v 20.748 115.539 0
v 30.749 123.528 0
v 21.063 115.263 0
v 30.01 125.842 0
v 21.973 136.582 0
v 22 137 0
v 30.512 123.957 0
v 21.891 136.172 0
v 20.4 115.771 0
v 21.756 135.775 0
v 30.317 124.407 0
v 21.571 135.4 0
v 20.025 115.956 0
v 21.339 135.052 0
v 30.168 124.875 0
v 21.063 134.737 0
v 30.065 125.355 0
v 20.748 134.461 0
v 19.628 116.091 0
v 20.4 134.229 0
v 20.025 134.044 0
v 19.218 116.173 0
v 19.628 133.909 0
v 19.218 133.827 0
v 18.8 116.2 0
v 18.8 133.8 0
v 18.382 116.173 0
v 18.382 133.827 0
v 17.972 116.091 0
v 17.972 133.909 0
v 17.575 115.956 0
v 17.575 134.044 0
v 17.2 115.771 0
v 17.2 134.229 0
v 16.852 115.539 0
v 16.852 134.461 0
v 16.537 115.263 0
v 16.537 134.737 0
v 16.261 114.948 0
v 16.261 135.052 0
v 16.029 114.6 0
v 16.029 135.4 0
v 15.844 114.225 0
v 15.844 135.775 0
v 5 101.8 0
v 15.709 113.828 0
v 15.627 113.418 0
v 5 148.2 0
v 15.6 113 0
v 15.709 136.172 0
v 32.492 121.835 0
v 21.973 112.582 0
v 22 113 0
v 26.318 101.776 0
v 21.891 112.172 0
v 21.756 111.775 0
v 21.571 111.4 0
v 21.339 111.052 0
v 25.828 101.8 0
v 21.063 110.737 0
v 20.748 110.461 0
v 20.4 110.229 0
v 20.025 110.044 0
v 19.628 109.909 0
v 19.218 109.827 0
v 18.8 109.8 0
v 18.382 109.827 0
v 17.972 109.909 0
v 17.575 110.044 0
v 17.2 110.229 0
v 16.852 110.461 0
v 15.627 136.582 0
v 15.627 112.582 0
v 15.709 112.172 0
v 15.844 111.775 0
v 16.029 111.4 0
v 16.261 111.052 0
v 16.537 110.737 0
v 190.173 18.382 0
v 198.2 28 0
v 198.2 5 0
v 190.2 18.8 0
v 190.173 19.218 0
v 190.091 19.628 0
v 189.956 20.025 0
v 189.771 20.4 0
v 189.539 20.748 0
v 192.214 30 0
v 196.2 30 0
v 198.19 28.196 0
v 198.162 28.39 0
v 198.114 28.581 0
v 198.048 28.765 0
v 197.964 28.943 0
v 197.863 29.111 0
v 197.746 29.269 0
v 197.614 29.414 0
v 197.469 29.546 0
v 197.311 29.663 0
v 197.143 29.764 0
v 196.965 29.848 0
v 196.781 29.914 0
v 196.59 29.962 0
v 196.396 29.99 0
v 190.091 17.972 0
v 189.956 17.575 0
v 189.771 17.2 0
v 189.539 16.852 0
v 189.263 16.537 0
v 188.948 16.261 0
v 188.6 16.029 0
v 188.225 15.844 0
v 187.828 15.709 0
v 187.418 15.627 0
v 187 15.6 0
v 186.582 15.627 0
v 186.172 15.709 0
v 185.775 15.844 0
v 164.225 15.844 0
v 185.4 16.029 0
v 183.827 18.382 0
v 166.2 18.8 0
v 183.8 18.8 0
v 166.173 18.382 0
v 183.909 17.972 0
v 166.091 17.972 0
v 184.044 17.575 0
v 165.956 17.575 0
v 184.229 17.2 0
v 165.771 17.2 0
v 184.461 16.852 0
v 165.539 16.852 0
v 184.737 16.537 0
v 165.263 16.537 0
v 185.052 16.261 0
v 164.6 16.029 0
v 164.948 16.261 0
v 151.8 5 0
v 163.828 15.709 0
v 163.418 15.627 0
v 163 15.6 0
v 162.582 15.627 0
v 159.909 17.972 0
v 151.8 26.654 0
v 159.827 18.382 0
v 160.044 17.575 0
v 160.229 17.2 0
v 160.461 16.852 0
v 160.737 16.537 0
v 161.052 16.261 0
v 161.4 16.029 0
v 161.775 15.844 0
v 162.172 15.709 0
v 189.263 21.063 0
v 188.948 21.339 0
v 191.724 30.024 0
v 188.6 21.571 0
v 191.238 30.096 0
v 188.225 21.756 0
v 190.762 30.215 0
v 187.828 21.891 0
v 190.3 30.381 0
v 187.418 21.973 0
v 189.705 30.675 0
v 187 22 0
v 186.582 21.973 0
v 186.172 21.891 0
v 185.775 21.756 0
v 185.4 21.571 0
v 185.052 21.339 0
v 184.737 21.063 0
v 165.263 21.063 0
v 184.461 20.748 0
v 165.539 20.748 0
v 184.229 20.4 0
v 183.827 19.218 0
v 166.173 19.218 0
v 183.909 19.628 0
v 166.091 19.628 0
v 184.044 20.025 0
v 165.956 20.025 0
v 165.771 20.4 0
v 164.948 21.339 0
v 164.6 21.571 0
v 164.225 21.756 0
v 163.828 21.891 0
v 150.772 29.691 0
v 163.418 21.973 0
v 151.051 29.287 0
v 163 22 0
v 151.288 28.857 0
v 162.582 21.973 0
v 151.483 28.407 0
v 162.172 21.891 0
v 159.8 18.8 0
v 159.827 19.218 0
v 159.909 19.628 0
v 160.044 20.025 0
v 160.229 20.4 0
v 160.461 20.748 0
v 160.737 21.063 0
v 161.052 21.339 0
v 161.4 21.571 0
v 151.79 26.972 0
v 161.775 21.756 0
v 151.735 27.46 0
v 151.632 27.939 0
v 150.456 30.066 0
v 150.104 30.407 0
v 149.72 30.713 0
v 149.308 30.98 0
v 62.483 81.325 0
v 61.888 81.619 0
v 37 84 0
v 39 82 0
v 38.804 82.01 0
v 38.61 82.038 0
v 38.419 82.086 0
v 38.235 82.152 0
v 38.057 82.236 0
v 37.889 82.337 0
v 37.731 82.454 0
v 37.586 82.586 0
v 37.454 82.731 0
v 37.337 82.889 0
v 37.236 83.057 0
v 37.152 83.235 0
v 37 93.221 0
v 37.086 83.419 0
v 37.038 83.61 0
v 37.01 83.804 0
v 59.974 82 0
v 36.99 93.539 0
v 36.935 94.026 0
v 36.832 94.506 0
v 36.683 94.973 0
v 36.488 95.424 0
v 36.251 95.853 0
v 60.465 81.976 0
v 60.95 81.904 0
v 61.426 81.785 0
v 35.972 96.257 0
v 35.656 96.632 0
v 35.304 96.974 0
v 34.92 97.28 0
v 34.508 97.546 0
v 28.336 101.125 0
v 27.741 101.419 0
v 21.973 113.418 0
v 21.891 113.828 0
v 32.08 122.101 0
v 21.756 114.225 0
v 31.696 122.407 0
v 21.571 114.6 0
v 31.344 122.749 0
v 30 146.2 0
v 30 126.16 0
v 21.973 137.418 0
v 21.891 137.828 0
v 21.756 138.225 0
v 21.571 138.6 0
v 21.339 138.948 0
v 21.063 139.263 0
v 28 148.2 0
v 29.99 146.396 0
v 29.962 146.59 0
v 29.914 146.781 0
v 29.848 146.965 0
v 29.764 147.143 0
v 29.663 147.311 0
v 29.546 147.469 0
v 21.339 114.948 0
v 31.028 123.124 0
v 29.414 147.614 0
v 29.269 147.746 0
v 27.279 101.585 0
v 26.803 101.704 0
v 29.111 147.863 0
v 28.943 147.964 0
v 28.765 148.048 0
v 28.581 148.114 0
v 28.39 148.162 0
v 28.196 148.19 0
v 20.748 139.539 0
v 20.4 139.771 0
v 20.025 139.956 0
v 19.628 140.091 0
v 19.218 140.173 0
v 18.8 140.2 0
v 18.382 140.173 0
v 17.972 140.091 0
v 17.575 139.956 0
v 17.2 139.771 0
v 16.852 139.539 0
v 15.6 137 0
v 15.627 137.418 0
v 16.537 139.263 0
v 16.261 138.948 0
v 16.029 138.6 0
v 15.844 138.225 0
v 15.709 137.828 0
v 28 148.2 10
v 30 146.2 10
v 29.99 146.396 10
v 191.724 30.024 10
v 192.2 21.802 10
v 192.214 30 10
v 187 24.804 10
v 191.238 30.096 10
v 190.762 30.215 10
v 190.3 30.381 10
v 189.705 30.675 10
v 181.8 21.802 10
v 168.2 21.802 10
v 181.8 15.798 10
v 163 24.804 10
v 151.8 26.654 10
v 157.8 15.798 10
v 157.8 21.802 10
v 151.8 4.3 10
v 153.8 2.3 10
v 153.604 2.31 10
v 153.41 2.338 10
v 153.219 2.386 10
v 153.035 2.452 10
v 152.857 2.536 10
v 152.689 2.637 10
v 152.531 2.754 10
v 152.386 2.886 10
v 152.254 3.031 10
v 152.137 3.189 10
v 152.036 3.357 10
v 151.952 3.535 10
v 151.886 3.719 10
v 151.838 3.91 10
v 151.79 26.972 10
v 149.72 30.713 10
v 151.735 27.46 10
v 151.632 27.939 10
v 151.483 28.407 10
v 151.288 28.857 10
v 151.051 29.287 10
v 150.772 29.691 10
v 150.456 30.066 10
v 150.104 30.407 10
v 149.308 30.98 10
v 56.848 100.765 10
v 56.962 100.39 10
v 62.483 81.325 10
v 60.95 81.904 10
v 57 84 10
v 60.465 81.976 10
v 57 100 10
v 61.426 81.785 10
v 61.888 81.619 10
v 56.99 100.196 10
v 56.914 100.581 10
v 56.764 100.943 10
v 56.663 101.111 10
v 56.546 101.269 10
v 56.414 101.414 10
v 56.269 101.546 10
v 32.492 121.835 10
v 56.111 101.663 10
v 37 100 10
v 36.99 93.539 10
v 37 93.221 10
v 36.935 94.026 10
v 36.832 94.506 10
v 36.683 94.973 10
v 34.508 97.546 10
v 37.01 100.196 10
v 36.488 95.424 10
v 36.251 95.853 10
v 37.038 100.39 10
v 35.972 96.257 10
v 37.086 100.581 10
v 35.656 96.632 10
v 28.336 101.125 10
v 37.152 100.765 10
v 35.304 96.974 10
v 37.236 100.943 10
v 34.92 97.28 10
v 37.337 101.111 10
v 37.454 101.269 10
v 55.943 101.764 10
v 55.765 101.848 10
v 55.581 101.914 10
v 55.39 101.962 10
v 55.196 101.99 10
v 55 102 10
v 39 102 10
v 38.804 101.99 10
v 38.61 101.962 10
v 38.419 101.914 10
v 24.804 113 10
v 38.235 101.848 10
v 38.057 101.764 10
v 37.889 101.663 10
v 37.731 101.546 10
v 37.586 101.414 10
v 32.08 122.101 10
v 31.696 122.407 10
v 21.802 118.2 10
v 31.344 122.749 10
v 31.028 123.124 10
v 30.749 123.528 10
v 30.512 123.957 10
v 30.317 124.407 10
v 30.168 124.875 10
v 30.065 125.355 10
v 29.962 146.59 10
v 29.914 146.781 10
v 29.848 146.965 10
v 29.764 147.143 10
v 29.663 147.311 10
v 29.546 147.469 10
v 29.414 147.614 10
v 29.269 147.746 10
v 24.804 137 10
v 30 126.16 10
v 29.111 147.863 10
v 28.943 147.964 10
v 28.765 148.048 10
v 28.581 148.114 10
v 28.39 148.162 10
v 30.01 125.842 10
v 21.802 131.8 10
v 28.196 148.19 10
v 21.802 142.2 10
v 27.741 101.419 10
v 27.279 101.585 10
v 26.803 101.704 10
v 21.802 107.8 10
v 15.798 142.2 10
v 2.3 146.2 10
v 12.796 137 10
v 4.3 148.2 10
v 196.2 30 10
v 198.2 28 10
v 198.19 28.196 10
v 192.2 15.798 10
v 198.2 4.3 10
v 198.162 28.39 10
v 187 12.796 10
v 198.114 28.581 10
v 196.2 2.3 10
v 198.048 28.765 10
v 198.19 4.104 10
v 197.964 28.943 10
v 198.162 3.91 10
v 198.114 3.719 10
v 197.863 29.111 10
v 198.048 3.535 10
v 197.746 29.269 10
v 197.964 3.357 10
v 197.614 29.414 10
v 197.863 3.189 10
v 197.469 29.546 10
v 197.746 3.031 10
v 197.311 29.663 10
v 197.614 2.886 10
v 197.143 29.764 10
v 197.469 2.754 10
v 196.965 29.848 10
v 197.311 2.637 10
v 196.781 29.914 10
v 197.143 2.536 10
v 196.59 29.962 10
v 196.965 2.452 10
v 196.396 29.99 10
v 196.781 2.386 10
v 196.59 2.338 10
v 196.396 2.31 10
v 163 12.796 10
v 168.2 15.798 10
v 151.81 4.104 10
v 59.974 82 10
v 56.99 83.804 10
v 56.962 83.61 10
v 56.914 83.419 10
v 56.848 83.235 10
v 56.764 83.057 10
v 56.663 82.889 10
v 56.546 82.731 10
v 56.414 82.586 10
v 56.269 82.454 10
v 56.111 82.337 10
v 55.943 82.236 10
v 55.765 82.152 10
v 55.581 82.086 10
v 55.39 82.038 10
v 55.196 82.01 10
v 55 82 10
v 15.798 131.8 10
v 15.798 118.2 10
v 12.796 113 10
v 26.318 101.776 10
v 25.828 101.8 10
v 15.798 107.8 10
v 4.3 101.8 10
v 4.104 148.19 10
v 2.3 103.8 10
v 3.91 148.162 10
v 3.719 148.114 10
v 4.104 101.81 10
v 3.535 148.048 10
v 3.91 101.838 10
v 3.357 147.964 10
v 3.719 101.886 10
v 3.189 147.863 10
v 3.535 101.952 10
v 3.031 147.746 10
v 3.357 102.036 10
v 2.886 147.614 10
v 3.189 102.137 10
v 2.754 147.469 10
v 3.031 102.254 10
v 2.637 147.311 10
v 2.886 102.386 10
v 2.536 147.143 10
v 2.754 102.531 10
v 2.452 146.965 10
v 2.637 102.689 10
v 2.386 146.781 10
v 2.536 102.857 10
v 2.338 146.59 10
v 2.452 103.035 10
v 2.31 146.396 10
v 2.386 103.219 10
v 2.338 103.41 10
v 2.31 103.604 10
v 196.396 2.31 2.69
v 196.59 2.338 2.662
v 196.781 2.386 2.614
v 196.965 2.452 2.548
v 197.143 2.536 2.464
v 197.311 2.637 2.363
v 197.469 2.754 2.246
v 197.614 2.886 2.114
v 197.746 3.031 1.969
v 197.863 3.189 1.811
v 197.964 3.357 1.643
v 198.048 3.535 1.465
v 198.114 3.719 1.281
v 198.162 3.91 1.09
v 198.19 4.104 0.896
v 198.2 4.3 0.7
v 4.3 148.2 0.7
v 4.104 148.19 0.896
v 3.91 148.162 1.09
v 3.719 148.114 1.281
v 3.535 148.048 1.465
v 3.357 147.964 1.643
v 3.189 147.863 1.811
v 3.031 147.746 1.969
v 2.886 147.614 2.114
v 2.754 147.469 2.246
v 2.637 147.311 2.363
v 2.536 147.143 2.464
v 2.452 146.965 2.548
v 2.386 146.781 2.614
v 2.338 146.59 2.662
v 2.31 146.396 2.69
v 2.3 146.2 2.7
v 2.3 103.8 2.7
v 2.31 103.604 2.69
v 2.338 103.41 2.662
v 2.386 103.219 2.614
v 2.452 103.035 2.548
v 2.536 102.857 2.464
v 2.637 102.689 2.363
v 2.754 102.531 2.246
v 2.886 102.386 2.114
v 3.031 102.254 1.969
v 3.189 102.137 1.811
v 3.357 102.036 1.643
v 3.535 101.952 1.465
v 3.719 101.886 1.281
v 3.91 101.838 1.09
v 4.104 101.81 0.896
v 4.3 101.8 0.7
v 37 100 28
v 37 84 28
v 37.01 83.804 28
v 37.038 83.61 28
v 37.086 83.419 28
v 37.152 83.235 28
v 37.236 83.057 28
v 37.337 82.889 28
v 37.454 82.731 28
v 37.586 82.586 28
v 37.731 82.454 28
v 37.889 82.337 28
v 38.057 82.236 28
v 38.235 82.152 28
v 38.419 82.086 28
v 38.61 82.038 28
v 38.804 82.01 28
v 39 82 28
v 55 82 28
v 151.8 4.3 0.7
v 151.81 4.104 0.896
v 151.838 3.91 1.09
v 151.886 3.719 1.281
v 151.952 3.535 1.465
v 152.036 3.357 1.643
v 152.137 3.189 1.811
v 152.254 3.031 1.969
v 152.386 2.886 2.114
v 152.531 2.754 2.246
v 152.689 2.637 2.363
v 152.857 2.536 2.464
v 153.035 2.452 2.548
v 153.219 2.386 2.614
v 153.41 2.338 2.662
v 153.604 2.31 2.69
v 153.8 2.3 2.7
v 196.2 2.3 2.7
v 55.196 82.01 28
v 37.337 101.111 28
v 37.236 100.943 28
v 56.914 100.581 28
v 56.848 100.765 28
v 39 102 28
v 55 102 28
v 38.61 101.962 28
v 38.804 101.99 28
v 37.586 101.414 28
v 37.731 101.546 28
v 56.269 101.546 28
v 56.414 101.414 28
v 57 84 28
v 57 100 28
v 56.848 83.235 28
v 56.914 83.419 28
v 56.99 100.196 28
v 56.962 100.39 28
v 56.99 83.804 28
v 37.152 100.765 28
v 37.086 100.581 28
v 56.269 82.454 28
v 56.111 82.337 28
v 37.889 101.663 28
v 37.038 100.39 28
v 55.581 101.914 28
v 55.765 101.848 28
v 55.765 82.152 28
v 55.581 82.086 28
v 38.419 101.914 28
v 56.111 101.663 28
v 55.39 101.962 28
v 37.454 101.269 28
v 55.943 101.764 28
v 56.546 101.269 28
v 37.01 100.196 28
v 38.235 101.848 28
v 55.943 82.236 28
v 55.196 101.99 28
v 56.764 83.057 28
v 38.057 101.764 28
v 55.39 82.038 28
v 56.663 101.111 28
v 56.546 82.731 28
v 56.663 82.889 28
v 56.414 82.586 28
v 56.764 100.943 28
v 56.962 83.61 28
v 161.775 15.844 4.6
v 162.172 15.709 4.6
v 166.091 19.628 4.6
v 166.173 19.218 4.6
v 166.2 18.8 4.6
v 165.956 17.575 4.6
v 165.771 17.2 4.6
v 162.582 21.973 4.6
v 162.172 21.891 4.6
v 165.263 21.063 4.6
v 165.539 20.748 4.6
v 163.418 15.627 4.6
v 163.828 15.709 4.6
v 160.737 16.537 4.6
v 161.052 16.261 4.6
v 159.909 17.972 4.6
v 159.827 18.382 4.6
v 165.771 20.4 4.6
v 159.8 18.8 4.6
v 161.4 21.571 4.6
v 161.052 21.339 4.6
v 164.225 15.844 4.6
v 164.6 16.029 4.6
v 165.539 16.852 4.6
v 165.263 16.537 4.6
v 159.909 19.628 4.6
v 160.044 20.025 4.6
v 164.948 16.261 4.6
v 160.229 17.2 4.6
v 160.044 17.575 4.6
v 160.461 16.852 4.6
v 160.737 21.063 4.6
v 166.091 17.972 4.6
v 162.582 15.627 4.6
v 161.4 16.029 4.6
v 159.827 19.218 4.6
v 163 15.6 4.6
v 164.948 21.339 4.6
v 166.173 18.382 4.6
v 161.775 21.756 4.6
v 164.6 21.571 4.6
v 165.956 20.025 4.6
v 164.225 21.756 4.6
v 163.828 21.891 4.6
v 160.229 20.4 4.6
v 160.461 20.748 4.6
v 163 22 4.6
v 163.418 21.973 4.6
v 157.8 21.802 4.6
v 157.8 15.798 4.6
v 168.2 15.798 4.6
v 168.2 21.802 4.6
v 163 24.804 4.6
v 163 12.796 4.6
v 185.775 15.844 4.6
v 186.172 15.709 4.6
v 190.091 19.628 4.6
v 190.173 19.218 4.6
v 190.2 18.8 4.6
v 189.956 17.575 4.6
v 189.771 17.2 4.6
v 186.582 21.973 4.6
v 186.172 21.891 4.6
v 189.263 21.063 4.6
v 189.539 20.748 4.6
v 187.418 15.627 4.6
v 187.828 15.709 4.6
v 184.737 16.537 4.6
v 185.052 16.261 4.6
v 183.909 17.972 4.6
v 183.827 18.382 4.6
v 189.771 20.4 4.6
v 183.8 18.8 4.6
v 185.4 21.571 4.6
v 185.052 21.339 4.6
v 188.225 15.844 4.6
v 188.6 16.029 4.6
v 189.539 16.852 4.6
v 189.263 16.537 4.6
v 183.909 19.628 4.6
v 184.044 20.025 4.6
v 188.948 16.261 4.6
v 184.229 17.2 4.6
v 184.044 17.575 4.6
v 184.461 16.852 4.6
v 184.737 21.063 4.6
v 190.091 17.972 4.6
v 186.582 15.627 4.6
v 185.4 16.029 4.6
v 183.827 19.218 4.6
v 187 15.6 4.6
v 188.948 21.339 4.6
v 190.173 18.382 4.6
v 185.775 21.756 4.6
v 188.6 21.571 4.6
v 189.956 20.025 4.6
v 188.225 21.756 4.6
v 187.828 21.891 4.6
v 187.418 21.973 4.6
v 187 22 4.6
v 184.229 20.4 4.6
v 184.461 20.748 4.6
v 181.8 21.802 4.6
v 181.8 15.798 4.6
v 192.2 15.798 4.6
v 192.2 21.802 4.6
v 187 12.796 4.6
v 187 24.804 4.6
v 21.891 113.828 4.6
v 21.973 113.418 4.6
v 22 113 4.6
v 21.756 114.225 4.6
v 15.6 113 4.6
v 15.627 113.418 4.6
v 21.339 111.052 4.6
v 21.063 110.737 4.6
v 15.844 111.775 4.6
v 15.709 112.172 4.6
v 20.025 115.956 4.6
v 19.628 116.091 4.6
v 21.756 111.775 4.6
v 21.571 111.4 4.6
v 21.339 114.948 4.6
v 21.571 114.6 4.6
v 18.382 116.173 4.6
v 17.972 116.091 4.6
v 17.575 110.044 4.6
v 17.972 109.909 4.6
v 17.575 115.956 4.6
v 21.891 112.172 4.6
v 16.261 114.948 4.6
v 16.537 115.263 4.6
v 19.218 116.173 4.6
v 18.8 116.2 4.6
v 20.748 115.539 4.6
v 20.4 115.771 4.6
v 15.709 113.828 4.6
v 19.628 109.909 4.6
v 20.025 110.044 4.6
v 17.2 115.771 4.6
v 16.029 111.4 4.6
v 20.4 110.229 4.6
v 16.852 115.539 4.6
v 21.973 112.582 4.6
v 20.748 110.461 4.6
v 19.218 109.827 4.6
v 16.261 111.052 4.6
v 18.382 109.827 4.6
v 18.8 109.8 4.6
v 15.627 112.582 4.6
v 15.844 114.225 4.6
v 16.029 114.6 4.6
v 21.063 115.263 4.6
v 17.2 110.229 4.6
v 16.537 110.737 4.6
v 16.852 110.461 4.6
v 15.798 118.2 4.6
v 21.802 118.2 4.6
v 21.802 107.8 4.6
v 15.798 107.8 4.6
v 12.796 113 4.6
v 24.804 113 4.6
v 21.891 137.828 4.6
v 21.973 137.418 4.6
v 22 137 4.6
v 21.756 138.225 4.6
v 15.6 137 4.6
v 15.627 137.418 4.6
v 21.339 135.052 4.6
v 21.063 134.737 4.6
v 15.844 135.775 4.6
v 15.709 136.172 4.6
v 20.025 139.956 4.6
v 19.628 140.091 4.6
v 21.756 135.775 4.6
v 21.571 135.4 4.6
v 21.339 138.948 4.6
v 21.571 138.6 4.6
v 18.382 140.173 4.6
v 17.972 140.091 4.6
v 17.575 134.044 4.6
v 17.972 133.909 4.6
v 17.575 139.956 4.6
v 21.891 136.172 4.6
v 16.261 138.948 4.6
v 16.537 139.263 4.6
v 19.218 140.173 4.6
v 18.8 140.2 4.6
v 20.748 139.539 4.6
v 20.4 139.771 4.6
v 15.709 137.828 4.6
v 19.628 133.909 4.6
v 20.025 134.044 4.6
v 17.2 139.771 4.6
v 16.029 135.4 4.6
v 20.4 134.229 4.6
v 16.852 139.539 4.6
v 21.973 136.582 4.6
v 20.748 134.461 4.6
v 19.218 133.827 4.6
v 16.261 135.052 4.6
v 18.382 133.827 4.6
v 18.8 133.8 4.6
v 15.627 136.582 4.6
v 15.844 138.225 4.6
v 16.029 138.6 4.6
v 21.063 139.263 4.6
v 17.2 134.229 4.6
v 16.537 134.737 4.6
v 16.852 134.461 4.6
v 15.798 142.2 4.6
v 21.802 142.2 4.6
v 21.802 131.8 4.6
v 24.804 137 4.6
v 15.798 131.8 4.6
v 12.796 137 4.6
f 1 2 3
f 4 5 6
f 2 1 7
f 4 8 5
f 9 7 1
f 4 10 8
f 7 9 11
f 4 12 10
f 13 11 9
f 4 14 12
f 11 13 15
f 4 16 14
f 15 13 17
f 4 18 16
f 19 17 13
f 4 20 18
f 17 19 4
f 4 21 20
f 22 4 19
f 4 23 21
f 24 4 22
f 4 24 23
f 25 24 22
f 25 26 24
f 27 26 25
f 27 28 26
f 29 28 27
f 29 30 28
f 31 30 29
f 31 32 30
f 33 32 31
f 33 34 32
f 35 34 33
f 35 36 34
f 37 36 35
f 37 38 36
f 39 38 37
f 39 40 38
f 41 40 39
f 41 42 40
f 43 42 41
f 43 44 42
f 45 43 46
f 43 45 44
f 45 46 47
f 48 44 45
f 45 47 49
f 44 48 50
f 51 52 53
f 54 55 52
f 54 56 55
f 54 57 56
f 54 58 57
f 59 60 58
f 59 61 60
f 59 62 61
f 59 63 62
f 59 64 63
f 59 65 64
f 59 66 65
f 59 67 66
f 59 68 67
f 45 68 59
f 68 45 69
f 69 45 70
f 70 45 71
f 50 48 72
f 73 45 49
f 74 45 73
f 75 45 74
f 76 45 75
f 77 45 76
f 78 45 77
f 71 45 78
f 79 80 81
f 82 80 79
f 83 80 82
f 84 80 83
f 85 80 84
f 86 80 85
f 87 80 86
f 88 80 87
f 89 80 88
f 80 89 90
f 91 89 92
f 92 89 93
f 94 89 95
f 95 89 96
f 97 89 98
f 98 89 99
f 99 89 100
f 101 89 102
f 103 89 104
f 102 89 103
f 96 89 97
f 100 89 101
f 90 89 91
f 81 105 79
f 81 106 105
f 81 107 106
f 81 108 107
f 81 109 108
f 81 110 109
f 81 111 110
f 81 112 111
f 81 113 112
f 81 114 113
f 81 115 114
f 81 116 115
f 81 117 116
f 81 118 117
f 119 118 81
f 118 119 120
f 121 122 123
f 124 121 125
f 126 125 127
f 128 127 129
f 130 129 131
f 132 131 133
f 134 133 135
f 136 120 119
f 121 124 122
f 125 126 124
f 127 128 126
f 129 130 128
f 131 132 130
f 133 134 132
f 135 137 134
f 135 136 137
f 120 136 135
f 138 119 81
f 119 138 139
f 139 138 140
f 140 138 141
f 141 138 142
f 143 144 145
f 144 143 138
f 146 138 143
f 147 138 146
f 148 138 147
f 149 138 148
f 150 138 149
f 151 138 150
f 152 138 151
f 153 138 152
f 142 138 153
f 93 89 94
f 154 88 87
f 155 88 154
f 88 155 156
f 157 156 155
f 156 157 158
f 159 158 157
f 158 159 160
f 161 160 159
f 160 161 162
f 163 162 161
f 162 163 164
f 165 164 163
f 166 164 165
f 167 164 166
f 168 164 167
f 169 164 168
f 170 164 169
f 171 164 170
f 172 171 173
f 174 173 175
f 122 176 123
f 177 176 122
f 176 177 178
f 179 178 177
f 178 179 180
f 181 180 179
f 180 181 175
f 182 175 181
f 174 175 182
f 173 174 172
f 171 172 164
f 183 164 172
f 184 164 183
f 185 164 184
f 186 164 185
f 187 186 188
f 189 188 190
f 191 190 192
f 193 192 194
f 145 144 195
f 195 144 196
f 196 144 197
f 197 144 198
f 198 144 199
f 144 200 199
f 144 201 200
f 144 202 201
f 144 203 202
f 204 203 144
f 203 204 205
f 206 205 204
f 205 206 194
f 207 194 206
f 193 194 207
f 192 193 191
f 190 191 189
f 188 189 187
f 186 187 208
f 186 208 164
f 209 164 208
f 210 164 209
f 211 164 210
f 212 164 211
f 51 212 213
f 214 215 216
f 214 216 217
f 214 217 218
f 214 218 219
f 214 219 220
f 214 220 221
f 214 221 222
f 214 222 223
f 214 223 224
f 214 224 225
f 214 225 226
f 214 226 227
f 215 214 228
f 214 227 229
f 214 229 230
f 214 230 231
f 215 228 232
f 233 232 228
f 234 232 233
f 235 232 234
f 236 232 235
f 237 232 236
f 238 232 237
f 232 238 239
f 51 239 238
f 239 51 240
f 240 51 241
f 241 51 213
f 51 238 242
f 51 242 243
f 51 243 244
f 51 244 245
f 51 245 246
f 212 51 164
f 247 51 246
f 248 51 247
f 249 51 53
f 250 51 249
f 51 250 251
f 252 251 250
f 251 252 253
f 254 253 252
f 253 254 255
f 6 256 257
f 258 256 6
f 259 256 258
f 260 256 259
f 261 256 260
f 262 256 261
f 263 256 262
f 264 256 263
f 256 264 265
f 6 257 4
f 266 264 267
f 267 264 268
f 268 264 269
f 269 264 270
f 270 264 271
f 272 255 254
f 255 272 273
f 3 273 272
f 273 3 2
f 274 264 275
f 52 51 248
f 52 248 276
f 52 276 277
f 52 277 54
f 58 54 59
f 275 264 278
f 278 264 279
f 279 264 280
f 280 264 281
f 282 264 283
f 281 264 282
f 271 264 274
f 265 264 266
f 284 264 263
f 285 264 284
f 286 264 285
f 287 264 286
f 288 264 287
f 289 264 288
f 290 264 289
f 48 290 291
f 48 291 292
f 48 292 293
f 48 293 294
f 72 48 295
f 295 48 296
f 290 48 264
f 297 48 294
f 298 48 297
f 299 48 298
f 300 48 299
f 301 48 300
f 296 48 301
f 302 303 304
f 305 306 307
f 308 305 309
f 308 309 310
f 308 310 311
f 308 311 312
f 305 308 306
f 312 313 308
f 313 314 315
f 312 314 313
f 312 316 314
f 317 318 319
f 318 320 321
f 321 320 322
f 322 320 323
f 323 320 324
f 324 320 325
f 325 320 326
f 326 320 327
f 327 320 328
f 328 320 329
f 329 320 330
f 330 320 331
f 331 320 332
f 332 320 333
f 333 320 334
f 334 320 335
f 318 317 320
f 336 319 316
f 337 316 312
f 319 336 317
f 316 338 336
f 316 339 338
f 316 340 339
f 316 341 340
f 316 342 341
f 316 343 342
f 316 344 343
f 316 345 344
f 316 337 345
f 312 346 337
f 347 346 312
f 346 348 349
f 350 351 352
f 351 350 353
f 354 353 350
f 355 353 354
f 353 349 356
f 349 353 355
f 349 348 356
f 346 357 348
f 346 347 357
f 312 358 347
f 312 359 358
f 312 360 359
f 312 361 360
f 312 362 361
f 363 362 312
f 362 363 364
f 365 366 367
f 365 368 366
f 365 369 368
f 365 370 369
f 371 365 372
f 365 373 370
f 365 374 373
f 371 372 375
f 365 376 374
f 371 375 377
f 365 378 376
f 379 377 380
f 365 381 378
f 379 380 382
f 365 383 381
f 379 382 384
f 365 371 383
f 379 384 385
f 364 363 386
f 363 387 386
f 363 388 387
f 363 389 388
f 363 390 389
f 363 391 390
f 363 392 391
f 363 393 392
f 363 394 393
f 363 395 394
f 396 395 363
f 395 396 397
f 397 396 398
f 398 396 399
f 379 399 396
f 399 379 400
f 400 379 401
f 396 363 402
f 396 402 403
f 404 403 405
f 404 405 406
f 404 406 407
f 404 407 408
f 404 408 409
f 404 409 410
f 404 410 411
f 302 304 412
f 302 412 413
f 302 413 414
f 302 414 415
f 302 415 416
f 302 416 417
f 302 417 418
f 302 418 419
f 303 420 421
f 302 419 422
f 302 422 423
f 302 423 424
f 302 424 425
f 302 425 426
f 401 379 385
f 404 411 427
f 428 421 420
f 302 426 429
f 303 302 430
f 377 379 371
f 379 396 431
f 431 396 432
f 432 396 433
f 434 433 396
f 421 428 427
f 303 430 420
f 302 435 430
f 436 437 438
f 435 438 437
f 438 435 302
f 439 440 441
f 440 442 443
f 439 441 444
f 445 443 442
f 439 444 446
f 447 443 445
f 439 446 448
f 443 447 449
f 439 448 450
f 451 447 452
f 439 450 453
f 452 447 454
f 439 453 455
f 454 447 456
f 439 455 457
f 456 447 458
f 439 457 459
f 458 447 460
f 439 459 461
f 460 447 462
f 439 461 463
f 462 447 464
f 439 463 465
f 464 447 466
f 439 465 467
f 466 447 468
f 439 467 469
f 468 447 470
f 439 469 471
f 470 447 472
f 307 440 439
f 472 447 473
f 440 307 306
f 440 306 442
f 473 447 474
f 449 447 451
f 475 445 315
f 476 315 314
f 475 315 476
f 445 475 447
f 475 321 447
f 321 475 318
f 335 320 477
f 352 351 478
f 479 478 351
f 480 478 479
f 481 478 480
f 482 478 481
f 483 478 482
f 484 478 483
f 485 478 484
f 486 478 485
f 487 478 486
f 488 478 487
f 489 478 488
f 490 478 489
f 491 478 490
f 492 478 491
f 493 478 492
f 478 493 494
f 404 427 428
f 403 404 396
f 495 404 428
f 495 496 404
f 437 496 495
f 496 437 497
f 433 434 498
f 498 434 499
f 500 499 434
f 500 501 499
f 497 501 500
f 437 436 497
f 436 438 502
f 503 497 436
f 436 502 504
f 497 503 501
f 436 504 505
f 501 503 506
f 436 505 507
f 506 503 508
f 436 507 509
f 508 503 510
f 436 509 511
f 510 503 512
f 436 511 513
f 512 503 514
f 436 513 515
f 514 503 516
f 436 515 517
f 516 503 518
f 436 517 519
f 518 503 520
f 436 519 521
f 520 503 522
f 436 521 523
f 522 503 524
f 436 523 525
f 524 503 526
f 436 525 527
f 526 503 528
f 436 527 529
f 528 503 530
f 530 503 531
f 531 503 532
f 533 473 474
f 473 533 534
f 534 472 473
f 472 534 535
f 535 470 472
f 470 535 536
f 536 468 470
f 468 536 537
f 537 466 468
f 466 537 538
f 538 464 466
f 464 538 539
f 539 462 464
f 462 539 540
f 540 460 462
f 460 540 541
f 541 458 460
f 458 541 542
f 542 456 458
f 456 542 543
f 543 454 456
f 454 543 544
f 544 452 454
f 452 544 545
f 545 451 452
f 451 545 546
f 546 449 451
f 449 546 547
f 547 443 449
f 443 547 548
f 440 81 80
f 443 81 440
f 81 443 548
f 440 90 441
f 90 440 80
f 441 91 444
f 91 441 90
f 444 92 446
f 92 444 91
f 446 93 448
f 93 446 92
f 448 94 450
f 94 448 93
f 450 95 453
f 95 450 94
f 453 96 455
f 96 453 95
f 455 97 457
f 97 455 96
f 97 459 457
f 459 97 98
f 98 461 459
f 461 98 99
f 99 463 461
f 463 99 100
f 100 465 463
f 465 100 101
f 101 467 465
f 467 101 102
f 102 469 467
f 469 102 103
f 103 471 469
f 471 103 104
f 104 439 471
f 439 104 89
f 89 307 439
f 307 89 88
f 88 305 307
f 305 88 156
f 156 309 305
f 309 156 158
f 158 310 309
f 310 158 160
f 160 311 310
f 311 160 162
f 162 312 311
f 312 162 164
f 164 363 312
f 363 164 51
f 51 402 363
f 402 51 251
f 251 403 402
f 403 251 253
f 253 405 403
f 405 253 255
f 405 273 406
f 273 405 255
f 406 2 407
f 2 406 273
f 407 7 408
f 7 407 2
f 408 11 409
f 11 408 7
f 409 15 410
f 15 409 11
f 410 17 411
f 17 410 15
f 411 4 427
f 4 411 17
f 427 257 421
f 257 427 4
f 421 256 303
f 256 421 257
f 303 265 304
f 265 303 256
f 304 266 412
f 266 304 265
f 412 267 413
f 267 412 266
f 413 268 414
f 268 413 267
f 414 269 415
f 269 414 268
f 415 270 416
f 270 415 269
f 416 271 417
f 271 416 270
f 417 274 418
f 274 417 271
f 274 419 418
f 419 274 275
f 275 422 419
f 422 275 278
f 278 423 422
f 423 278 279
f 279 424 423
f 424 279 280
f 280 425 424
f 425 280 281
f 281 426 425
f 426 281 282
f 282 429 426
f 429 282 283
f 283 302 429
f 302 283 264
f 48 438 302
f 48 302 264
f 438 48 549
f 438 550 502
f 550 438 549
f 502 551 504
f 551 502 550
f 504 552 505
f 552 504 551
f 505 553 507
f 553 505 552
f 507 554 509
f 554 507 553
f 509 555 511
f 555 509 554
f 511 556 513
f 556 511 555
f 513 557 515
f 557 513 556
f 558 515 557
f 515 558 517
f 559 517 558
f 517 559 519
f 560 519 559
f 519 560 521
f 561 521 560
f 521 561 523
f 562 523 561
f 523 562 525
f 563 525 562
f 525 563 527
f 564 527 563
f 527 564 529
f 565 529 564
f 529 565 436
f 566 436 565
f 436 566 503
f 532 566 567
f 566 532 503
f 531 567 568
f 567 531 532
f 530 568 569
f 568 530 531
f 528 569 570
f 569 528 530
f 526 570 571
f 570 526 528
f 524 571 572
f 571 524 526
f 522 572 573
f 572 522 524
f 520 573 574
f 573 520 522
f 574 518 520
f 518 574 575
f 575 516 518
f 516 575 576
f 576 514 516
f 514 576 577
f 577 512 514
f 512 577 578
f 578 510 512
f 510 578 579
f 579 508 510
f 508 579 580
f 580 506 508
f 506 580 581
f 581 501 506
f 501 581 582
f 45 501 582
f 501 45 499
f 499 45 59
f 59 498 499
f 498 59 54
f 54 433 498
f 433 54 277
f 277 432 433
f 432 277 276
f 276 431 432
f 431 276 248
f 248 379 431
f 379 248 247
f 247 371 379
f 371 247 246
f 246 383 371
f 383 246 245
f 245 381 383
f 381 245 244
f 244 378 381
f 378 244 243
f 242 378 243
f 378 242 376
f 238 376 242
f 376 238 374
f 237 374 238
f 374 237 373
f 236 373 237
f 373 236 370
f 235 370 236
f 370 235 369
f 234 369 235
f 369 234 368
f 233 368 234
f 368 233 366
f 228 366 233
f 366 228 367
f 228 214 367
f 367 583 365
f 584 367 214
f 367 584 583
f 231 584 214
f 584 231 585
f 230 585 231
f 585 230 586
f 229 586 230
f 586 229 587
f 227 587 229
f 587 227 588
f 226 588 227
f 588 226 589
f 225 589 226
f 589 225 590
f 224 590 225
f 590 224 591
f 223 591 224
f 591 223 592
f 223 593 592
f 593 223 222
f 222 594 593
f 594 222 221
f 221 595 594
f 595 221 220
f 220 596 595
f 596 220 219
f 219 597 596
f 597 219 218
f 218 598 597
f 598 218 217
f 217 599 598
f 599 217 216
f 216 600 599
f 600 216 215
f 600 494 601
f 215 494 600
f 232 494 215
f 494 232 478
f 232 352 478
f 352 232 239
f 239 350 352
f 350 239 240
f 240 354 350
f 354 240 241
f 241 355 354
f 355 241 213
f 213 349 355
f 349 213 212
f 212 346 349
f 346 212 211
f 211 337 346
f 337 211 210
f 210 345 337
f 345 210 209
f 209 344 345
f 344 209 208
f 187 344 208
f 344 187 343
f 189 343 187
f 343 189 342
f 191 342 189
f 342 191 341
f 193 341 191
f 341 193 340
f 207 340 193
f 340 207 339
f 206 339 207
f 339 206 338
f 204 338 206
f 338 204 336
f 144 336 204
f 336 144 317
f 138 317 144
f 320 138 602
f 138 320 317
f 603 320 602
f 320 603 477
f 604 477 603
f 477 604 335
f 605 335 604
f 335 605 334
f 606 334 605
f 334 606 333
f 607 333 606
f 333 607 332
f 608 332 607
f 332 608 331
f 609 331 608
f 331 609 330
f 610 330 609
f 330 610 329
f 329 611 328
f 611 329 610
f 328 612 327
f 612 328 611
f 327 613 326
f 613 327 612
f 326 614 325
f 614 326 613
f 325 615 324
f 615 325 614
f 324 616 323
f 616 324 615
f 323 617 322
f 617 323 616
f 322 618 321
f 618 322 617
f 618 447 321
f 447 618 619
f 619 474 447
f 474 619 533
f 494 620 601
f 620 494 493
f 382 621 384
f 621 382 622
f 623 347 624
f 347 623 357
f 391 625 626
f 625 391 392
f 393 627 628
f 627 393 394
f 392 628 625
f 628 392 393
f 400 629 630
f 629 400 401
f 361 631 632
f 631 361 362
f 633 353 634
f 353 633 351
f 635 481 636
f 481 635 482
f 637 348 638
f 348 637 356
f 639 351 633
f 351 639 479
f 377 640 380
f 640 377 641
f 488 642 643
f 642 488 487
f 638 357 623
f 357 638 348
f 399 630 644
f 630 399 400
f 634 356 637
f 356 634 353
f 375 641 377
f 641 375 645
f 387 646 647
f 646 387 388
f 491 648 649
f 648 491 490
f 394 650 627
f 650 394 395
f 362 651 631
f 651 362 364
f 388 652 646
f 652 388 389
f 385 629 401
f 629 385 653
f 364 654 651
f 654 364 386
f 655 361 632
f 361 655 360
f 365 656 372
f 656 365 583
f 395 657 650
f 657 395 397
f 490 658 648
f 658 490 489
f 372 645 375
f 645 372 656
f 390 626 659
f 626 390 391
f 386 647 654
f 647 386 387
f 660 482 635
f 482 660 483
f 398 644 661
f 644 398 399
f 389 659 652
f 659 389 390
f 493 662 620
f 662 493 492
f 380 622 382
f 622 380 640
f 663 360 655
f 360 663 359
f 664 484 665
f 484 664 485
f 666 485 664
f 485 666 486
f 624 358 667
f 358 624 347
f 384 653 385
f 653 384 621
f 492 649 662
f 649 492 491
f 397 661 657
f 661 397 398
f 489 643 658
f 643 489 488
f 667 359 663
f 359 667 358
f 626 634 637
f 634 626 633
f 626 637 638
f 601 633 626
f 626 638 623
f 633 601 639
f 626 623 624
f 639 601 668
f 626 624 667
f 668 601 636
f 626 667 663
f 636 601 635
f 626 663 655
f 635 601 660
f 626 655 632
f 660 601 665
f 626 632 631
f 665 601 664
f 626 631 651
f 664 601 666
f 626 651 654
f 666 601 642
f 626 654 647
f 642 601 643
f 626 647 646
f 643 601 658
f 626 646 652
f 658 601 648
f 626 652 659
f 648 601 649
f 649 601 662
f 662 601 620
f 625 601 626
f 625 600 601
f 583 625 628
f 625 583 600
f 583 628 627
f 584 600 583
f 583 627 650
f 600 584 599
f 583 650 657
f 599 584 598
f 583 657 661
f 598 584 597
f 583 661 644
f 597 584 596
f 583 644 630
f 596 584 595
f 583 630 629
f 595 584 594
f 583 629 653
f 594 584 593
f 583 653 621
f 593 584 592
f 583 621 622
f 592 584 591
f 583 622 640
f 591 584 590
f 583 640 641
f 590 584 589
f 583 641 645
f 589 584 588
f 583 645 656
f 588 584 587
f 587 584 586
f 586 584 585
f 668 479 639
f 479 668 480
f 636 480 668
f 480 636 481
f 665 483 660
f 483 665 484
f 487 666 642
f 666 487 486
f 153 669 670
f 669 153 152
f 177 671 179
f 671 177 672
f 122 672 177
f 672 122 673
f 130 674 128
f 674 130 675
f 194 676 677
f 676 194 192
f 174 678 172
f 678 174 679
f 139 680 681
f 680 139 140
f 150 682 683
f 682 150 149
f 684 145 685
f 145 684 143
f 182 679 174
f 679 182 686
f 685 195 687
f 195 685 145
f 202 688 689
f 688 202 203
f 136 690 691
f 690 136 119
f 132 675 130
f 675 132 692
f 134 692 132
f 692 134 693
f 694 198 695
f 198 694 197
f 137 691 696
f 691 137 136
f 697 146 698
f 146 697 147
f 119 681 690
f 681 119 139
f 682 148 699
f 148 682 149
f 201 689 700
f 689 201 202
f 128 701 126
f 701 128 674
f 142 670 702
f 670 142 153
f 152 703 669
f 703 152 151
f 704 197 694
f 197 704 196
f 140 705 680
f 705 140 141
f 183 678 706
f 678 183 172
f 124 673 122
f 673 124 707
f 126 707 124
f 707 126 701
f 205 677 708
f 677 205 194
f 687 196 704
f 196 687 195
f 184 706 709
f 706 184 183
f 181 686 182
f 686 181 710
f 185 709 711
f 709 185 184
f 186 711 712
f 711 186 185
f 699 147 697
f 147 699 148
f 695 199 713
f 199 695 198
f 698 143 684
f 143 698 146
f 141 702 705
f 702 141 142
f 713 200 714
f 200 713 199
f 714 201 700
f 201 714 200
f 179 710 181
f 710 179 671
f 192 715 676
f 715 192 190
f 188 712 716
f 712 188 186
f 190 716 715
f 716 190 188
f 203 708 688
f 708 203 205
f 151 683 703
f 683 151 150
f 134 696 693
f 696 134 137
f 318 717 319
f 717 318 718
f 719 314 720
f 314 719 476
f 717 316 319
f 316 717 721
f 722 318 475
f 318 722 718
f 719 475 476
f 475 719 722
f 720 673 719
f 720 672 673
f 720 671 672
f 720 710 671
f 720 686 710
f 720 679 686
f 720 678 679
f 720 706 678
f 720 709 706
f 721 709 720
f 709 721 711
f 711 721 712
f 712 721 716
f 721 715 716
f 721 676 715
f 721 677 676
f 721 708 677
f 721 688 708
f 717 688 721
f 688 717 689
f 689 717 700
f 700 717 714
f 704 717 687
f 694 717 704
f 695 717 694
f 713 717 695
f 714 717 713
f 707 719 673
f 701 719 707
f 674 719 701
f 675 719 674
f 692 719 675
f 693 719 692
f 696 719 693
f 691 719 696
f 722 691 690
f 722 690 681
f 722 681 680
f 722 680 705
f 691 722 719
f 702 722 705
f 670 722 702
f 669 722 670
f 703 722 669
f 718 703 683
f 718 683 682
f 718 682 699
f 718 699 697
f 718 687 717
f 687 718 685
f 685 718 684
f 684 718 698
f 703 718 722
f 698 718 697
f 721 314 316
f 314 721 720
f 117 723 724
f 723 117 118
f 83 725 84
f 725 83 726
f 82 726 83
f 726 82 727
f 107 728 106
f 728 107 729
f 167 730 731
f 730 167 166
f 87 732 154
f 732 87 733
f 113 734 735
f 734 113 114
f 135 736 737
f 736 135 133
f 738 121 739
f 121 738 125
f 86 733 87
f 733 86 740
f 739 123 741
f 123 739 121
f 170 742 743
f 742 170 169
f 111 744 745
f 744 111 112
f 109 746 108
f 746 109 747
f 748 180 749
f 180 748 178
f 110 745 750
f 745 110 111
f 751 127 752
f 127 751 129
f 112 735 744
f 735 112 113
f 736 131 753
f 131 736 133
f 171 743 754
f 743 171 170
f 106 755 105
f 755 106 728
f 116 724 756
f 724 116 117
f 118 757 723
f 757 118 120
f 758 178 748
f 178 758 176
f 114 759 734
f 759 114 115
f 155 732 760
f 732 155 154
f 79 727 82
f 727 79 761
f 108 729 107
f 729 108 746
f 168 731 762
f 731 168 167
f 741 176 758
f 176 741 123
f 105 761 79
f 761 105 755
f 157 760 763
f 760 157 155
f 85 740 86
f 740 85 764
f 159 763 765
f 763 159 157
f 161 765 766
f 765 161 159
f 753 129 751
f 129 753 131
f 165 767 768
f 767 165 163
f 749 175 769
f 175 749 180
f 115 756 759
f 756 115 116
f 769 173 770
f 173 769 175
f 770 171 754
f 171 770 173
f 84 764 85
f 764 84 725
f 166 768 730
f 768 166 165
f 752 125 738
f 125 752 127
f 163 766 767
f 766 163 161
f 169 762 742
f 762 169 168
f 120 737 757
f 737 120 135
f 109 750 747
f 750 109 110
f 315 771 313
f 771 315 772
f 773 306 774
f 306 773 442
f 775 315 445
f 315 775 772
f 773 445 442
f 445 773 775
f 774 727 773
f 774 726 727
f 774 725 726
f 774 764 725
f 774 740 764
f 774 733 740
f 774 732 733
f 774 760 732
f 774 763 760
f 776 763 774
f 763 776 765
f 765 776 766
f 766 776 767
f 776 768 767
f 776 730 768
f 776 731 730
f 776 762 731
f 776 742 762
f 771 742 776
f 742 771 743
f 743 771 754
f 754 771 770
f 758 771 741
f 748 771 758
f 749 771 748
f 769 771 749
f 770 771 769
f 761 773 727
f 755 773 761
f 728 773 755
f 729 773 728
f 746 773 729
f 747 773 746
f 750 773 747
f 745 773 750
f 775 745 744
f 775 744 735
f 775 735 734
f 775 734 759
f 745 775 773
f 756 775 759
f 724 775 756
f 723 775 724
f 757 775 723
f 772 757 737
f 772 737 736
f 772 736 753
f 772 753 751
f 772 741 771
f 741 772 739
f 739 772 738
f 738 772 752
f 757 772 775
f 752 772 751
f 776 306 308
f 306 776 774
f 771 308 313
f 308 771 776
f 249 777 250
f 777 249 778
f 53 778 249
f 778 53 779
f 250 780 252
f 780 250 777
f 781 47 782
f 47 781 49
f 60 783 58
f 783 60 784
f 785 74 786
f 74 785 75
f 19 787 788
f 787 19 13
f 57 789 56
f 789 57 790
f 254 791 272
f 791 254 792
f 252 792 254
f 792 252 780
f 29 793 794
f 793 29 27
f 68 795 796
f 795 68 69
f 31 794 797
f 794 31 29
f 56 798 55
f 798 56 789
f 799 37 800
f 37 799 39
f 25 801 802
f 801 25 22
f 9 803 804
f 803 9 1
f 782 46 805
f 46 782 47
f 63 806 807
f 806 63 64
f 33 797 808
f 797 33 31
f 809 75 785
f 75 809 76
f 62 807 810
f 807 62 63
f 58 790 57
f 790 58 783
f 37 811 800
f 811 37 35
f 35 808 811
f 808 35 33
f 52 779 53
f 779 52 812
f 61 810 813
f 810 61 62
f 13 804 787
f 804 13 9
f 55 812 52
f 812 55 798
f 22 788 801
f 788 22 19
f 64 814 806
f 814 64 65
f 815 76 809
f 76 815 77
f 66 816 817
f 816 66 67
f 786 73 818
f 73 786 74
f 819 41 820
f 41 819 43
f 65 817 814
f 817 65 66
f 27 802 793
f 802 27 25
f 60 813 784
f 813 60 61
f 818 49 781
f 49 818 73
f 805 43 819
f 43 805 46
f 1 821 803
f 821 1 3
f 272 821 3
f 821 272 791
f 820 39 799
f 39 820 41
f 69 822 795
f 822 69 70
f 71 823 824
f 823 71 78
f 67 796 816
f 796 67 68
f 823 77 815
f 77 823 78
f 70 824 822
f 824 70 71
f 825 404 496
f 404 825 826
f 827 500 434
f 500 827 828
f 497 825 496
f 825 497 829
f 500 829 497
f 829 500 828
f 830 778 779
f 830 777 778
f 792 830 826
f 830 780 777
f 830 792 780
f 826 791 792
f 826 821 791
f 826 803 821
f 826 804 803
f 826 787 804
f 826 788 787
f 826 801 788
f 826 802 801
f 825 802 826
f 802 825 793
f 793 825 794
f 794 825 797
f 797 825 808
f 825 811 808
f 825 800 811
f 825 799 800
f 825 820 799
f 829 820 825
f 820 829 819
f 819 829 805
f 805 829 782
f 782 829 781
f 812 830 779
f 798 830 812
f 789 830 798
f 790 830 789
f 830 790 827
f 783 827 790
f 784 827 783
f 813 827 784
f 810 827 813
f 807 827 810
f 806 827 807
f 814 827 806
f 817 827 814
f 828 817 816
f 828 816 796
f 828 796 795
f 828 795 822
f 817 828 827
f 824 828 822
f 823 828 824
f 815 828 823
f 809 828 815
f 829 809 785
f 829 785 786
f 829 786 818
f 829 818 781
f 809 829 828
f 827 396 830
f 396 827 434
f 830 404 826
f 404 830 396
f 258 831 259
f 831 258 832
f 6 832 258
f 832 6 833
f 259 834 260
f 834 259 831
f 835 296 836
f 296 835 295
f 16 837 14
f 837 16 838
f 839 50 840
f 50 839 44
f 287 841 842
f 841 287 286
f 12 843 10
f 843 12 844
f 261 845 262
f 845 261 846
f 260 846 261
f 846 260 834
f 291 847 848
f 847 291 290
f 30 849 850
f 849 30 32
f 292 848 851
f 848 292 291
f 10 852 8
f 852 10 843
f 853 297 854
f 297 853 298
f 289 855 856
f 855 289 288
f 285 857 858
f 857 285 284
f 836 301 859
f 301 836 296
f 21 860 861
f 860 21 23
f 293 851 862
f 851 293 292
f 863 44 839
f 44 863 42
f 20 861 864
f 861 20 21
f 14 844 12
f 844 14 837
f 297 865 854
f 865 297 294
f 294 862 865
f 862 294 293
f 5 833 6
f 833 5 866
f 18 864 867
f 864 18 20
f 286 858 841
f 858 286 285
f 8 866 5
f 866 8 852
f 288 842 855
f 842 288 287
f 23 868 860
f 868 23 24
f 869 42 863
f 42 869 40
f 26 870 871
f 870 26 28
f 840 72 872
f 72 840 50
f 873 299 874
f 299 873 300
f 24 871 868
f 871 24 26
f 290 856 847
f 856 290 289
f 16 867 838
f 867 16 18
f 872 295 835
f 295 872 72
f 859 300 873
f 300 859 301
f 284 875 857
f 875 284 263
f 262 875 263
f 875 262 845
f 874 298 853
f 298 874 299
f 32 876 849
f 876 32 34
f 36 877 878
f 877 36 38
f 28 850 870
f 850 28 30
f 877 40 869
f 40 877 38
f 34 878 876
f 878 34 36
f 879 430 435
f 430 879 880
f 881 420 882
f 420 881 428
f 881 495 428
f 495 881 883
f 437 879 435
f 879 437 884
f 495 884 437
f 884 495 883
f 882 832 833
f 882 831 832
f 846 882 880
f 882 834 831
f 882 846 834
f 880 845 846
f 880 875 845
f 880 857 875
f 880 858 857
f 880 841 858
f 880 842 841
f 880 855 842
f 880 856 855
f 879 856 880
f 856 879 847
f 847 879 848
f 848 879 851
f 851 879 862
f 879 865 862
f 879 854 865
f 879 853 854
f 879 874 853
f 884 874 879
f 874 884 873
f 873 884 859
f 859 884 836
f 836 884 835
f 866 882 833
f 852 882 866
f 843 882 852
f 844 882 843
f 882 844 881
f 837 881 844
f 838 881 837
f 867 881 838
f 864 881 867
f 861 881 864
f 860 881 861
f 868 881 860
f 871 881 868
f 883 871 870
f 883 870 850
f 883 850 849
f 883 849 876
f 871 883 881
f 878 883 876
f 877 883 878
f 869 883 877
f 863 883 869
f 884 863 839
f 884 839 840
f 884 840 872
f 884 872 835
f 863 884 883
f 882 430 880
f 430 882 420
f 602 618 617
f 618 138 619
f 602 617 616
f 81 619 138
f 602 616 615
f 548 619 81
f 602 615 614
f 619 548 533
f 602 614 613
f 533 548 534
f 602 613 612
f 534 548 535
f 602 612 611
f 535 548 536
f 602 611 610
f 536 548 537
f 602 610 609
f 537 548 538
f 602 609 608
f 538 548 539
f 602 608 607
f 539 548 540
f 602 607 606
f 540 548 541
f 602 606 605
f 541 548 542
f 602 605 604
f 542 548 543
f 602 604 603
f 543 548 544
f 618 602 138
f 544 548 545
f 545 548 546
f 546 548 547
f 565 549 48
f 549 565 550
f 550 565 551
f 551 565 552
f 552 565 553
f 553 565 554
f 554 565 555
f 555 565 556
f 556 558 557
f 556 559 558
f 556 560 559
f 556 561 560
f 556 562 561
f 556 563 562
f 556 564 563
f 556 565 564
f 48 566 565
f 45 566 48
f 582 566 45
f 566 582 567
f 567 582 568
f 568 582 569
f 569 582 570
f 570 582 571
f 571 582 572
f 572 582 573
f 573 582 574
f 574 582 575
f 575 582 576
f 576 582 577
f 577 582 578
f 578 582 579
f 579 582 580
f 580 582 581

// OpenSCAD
// file: ../../../modules/steel_rack.scad
use <bolts.scad>;

bolt_edge_offset = 15;
bolt_positions = [
  bolt_edge_offset,
  bolt_edge_offset + 98,
  bolt_edge_offset + 98 + 24,
];

module bolt_and_nut(y, h) {
  nut_thickness = 5;
  translate([0, y, h / 2])
    m6_bolt_hole(h + 1, center = true);
  translate([0, y, h - nut_thickness / 2])
    rotate([0, 0, 90])
    m6_nut_trap(nut_thickness, center = true);
}

module long_bar(w, y, h) {
  difference() {
    translate([w / 2, y / 2, h / 2])
      cube([w, y, h], center = true);

    for (x = bolt_positions) {
      translate([x, 0, 0])
        bolt_and_nut(y / 2, h);
    }
  }
}

module short_bar(w, y, h) {
  difference() {
    translate([w / 2, y / 2, h / 2])
      cube([w, y, h], center = true);

    translate([bolt_positions[0], 0, 0])
      bolt_and_nut(y / 2, h);
  }
}

module fillet_profile(r, h) {
  linear_extrude(height = h, center = true)
    difference() {
      square([r, r]);
      circle(r = r, $fn = 64);
    }
}
// file: ../../../modules/slide_rail_outer_bracket.scad
use <bolts.scad>
use <steel_rack.scad>

// スライドレール外側とL字アングルを接合するL字ブラケット。
// 設計の経緯と確定値は ledger/designs/steel-rack-500x400.md が正本。
//
// 座標系 (部品自身の datum):
//   X = 0 がこの部品側のL字アングル外側面。部品はアングル板厚の内側から始まる
//   Y = 0 がスライドレール外側面。+Y がラック外側
//   Z = 0 が部品底面 (レール下端と一致)
// front は screw_x = [37, 101.5]、rear は [79.5, 176] を自分の datum
// から渡す。 M6 が高さ 22.5±12 の対称配置のため部品は Z 反転対称になり、
// 左右のレールにも上下反転するだけで同じ2部品を使い回せる。

bracket_height = 45;
flange_t = 10; // 短辺 (X方向厚) の厚さ
// 長辺 (Y方向厚) の厚さ。旧断面は flange_t=10 を共用していたが、レール面を
// rail_offset 分外へ出すと M6 ナット挿入口が長辺と重なるため 2mm 削った
// (10→8、user決定)。ナット六角の内縁 (y=8.000) と長辺外面がツライチになる
arm_t = 8;
// レール接触面のラック外側オフセット。組付け実測でレール間隔が 385mm しか
// なくケース 412mm が入らないため、(412 - 385) / 2 + 0.5 = 14mm ずつ
// 各レールを外側へ移す (user指示)。M6 実穴は既に開いており位置を変えられない
rail_offset = 14;
inner_r = 4;
m6_z = [ 10.5, 34.5 ];
// クリアランス基準: 呼び寸法 + 0.4mm (実プリントの嵌合結果から拡大)
m6_pass_flat = 6.4; // M6ボルト通し六角の二面幅 (手前5mm)
m6_nut_flat = 10.4; // M6ナット窪み六角の二面幅 (奥5mm、ナット実測9.8 + 実効0.6)
m6_stage_depth = 5;
screw_z = 22.5;
m4_pass_flat = 4.4; // M4小トラスネジ通し六角の二面幅
m4_nut_flat = 7.4; // M4ナット窪み六角の二面幅 (ナット実測6.8 + 実効0.6)
m4_nut_depth = 2.8; // M4ナット窪みの深さ (user指定)
edge_margin = 8; // 穴の外縁から部品端までの余白 (自由な辺のみ)
angle_t = 2.2; // L字アングルの板厚

// 六角プリズム: 軸X・上下の辺が水平 (flat-up)。
// 天井を短い水平ブリッジにして垂れの改善を狙う
// (point-up だと天井面が水平から30°になり垂れた — 嵌合試験で確認済み)
module
hex_x_flat_up(flat_d, l)
{
    rotate([ 0, 90, 0 ]) rotate([ 0, 0, 90 ]) hex_hole(flat_d = flat_d, h = l);
}

// 六角プリズム: 軸Y・上下の辺が水平 (flat-up)。M6と同じくブリッジ天井
module
hex_y_flat_up(flat_d, l)
{
    rotate([ 90, 0, 0 ]) hex_hole(flat_d = flat_d, h = l);
}

module
slide_rail_outer_bracket(screw_x, name = "bracket")
{
    // flat-up配置では水平方向の穴半径は対角/2 (= 二面幅/(2*cos30))。
    // 8mm余白の契約はこの実半径に対して守る
    m6_nut_diag = m6_nut_flat / cos(30);
    m4_nut_diag = m4_nut_flat / cos(30);
    // M6中心: 実物のアングルには旧断面 (長辺厚10) の導出値
    // (厚10 + 内側R + 余白 + M6六角対角/2 = 28.0044) で既に穴が開いている。
    // 旧導出式から rail_offset を引くことで M6 実穴と部品外端の絶対位置を
    // 保ったまま、レール接触面 (y=0) だけをラック外側へ 14mm 出す
    m6_y = flange_t + inner_r + edge_margin + m6_nut_diag / 2 - rail_offset;
    short_len = m6_y + m6_nut_diag / 2 + edge_margin;
    // 長辺のX終端: 最奥のM4穴の最大断面 (ナット窪みの対角の半分) + 余白
    arm_end = max(screw_x) + m4_nut_diag / 2 + edge_margin;

    echo(str("CONTRACT ", name, ": height = ", bracket_height));
    echo(str("CONTRACT ", name, ": flange_t = ", flange_t));
    echo(str("CONTRACT ", name, ": arm_t = ", arm_t));
    echo(str("CONTRACT ", name, ": rail_offset = ", rail_offset));
    echo(str("CONTRACT ", name, ": inner_r = ", inner_r));
    echo(str("CONTRACT ", name, ": m6_z = ", m6_z));
    echo(str("CONTRACT ", name, ": m6_pass_flat = ", m6_pass_flat));
    echo(str("CONTRACT ", name, ": m6_nut_flat = ", m6_nut_flat));
    echo(str("CONTRACT ", name, ": screw_z = ", screw_z));
    echo(str("CONTRACT ", name, ": m4_pass_flat = ", m4_pass_flat));
    echo(str("CONTRACT ", name, ": m4_nut_flat = ", m4_nut_flat));
    echo(str("CONTRACT ", name, ": m4_nut_depth = ", m4_nut_depth));
    echo(str("CONTRACT ", name, ": edge_margin = ", edge_margin));
    echo(str("CONTRACT ", name, ": angle_t = ", angle_t));
    echo(str("CONTRACT ", name, ": screw_x = ", screw_x));
    echo(str("CONTRACT ",
             name,
             ": m6_y = ",
             m6_y,
             ", short_len = ",
             short_len,
             ", arm_end = ",
             arm_end));

    // 余白の契約 (自由な辺のみ。高さ45とM6のZはuser固定値なので対象外)。
    // M6ナット六角の内縁 (m6_y - 対角/2 = 8.000) は長辺外面 (y = arm_t) と
    // ツライチで、ナット挿入口が長辺に塞がれない (1e-9 は浮動小数の丸め猶予)
    assert(m6_y - m6_nut_diag / 2 >= arm_t - 1e-9,
           "M6 nut slot is blocked by the arm");
    assert(short_len - (m6_y + m6_nut_diag / 2) >= edge_margin,
           "M6 hole too close to the short-flange edge");
    assert(arm_end - (max(screw_x) + m4_nut_diag / 2) >= edge_margin,
           "M4 hole too close to the arm end");
    assert(min(screw_x) - m4_nut_diag / 2 >= angle_t + flange_t,
           "M4 hole overlaps the short flange");

    difference()
    {
        union()
        {
            // 短辺: アングル内側に当たる縦板 (M6で締結)
            translate([ angle_t, 0, 0 ])
                cube([ flange_t, short_len, bracket_height ]);

            // 長辺: レール外側面に当たる横板 (M4小トラスネジ+ナットで締結)
            translate([ angle_t, 0, 0 ])
                cube([ arm_end - angle_t, arm_t, bracket_height ]);

            // 内側コーナーのR4フィレット (応力集中の回避)
            translate([
                angle_t + flange_t + inner_r,
                arm_t + inner_r,
                bracket_height / 2
            ]) rotate([ 0, 0, 180 ]) fillet_profile(inner_r, bracket_height);
        }

        // M6の2段六角穴 (軸X・flat-up): 手前5mmが通し、奥5mmがナット窪み。
        // ナット窪みは +X へ延長した挿入回廊 (x=7.2..17): 短辺の背面から
        // fillet の掛かる区間を局所カットし、fillet 外端 (x=16.2) を 0.8mm
        // 超えて開放することで M6 ナットを +X 側から真っ直ぐ挿入できる
        // (fillet と挿入経路の干渉分を削るのは user 許容)。
        // 六角の下頂点 (y=8.000) は長辺外面とツライチで、正確な接触は
        // 退化した稜 (非多様体STL) を作るため、hull で 0.2mm 下へ掃引して
        // 長辺外面に浅い逃げ溝を彫る (ナットの嵌合には影響しない)
        slot_start = angle_t + flange_t - m6_stage_depth;
        slot_end = angle_t + flange_t + inner_r + 0.8;
        slot_relief = 0.2;
        for (z = m6_z) {
            translate([ angle_t + m6_stage_depth / 2 - 0.05, m6_y, z ])
                hex_x_flat_up(m6_pass_flat, m6_stage_depth + 0.1);
            translate([ (slot_start + slot_end) / 2, m6_y, z ]) hull()
            {
                hex_x_flat_up(m6_nut_flat, slot_end - slot_start);
                translate([ 0, -slot_relief, 0 ])
                    hex_x_flat_up(m6_nut_flat, slot_end - slot_start);
            }
        }

        // M4小トラスネジの穴 (軸Y・flat-up):
        // 通しは全厚を貫通し、L字の内側面 (y=8) から深さ2.8mmのナット窪み。
        // ネジはレール内側から刺さり
        // (トラス頭はスライダーと干渉しない実測済み)、
        // ナットが窪みの底で受けてレール板とブラケットを共締めする
        for (x = screw_x) {
            translate([ x, arm_t / 2, screw_z ])
                hex_y_flat_up(m4_pass_flat, arm_t + 0.2);
            translate([ x, arm_t - m4_nut_depth / 2 + 0.05, screw_z ])
                hex_y_flat_up(m4_nut_flat, m4_nut_depth + 0.1);
        }
    }
}
// file: ../../../modules/bolts.scad
module nut_trap(d, h, center = true) {
  linear_extrude(height = h, center = center)
  circle(d = d / cos(30), $fn = 6);
}

module bolt_hole(d, h, center = true) {
  linear_extrude(height = h, center = center)
  circle(d = d, $fn = 64);
}

// Hex holes for self-tapping (nominal - 0.2mm)
module hex_hole(flat_d, h) {
  linear_extrude(height = h, center = true)
  circle(d = flat_d / cos(30), $fn = 6);
}

module m3_bolt_hexhole(h) {
  rotate([0, 0, 90]) hex_hole(flat_d = 2.8, h = h);
}

module m4_bolt_hexhole(h) {
  rotate([0, 0, 90]) hex_hole(flat_d = 3.8, h = h);
}

module m6_bolt_hexhole(h) {
  rotate([0, 0, 90]) hex_hole(flat_d = 5.8, h = h);
}

module m8_bolt_hexhole(h) {
  rotate([0, 0, 90]) hex_hole(flat_d = 7.8, h = h);
}

// M3
module m3_bolt_hole(h, center = false) { bolt_hole(d = 3.4, h = h, center = center); }
module m3_nut_trap(h, center = false) { nut_trap(d = 5.7, h = h, center = center); }

// M4
module m4_bolt_hole(h, center = false) { bolt_hole(d = 4.4, h = h, center = center); }
module m4_nut_trap(h, center = false) { nut_trap(d = 7.5, h = h, center = center); }

// M6
module m6_bolt_hole(h, center = false) { bolt_hole(d = 6.2, h = h, center = center); }
module m6_nut_trap(h, center = false) { nut_trap(d = 10.2, h = h, center = center); }

// M8
module m8_bolt_hole(h, center = false) { bolt_hole(d = 8.4, h = h, center = center); }
module m8_nut_trap(h, center = false) { nut_trap(d = 13.3, h = h, center = center); }
// main file
use <../../../modules/shelf_frame.scad>

// ケース棚の筋交い。手前左・奥右用。土台の下面をビルドプレートへ置いた向き。
shelf_frame_flat_print() shelf_frame_brace();
